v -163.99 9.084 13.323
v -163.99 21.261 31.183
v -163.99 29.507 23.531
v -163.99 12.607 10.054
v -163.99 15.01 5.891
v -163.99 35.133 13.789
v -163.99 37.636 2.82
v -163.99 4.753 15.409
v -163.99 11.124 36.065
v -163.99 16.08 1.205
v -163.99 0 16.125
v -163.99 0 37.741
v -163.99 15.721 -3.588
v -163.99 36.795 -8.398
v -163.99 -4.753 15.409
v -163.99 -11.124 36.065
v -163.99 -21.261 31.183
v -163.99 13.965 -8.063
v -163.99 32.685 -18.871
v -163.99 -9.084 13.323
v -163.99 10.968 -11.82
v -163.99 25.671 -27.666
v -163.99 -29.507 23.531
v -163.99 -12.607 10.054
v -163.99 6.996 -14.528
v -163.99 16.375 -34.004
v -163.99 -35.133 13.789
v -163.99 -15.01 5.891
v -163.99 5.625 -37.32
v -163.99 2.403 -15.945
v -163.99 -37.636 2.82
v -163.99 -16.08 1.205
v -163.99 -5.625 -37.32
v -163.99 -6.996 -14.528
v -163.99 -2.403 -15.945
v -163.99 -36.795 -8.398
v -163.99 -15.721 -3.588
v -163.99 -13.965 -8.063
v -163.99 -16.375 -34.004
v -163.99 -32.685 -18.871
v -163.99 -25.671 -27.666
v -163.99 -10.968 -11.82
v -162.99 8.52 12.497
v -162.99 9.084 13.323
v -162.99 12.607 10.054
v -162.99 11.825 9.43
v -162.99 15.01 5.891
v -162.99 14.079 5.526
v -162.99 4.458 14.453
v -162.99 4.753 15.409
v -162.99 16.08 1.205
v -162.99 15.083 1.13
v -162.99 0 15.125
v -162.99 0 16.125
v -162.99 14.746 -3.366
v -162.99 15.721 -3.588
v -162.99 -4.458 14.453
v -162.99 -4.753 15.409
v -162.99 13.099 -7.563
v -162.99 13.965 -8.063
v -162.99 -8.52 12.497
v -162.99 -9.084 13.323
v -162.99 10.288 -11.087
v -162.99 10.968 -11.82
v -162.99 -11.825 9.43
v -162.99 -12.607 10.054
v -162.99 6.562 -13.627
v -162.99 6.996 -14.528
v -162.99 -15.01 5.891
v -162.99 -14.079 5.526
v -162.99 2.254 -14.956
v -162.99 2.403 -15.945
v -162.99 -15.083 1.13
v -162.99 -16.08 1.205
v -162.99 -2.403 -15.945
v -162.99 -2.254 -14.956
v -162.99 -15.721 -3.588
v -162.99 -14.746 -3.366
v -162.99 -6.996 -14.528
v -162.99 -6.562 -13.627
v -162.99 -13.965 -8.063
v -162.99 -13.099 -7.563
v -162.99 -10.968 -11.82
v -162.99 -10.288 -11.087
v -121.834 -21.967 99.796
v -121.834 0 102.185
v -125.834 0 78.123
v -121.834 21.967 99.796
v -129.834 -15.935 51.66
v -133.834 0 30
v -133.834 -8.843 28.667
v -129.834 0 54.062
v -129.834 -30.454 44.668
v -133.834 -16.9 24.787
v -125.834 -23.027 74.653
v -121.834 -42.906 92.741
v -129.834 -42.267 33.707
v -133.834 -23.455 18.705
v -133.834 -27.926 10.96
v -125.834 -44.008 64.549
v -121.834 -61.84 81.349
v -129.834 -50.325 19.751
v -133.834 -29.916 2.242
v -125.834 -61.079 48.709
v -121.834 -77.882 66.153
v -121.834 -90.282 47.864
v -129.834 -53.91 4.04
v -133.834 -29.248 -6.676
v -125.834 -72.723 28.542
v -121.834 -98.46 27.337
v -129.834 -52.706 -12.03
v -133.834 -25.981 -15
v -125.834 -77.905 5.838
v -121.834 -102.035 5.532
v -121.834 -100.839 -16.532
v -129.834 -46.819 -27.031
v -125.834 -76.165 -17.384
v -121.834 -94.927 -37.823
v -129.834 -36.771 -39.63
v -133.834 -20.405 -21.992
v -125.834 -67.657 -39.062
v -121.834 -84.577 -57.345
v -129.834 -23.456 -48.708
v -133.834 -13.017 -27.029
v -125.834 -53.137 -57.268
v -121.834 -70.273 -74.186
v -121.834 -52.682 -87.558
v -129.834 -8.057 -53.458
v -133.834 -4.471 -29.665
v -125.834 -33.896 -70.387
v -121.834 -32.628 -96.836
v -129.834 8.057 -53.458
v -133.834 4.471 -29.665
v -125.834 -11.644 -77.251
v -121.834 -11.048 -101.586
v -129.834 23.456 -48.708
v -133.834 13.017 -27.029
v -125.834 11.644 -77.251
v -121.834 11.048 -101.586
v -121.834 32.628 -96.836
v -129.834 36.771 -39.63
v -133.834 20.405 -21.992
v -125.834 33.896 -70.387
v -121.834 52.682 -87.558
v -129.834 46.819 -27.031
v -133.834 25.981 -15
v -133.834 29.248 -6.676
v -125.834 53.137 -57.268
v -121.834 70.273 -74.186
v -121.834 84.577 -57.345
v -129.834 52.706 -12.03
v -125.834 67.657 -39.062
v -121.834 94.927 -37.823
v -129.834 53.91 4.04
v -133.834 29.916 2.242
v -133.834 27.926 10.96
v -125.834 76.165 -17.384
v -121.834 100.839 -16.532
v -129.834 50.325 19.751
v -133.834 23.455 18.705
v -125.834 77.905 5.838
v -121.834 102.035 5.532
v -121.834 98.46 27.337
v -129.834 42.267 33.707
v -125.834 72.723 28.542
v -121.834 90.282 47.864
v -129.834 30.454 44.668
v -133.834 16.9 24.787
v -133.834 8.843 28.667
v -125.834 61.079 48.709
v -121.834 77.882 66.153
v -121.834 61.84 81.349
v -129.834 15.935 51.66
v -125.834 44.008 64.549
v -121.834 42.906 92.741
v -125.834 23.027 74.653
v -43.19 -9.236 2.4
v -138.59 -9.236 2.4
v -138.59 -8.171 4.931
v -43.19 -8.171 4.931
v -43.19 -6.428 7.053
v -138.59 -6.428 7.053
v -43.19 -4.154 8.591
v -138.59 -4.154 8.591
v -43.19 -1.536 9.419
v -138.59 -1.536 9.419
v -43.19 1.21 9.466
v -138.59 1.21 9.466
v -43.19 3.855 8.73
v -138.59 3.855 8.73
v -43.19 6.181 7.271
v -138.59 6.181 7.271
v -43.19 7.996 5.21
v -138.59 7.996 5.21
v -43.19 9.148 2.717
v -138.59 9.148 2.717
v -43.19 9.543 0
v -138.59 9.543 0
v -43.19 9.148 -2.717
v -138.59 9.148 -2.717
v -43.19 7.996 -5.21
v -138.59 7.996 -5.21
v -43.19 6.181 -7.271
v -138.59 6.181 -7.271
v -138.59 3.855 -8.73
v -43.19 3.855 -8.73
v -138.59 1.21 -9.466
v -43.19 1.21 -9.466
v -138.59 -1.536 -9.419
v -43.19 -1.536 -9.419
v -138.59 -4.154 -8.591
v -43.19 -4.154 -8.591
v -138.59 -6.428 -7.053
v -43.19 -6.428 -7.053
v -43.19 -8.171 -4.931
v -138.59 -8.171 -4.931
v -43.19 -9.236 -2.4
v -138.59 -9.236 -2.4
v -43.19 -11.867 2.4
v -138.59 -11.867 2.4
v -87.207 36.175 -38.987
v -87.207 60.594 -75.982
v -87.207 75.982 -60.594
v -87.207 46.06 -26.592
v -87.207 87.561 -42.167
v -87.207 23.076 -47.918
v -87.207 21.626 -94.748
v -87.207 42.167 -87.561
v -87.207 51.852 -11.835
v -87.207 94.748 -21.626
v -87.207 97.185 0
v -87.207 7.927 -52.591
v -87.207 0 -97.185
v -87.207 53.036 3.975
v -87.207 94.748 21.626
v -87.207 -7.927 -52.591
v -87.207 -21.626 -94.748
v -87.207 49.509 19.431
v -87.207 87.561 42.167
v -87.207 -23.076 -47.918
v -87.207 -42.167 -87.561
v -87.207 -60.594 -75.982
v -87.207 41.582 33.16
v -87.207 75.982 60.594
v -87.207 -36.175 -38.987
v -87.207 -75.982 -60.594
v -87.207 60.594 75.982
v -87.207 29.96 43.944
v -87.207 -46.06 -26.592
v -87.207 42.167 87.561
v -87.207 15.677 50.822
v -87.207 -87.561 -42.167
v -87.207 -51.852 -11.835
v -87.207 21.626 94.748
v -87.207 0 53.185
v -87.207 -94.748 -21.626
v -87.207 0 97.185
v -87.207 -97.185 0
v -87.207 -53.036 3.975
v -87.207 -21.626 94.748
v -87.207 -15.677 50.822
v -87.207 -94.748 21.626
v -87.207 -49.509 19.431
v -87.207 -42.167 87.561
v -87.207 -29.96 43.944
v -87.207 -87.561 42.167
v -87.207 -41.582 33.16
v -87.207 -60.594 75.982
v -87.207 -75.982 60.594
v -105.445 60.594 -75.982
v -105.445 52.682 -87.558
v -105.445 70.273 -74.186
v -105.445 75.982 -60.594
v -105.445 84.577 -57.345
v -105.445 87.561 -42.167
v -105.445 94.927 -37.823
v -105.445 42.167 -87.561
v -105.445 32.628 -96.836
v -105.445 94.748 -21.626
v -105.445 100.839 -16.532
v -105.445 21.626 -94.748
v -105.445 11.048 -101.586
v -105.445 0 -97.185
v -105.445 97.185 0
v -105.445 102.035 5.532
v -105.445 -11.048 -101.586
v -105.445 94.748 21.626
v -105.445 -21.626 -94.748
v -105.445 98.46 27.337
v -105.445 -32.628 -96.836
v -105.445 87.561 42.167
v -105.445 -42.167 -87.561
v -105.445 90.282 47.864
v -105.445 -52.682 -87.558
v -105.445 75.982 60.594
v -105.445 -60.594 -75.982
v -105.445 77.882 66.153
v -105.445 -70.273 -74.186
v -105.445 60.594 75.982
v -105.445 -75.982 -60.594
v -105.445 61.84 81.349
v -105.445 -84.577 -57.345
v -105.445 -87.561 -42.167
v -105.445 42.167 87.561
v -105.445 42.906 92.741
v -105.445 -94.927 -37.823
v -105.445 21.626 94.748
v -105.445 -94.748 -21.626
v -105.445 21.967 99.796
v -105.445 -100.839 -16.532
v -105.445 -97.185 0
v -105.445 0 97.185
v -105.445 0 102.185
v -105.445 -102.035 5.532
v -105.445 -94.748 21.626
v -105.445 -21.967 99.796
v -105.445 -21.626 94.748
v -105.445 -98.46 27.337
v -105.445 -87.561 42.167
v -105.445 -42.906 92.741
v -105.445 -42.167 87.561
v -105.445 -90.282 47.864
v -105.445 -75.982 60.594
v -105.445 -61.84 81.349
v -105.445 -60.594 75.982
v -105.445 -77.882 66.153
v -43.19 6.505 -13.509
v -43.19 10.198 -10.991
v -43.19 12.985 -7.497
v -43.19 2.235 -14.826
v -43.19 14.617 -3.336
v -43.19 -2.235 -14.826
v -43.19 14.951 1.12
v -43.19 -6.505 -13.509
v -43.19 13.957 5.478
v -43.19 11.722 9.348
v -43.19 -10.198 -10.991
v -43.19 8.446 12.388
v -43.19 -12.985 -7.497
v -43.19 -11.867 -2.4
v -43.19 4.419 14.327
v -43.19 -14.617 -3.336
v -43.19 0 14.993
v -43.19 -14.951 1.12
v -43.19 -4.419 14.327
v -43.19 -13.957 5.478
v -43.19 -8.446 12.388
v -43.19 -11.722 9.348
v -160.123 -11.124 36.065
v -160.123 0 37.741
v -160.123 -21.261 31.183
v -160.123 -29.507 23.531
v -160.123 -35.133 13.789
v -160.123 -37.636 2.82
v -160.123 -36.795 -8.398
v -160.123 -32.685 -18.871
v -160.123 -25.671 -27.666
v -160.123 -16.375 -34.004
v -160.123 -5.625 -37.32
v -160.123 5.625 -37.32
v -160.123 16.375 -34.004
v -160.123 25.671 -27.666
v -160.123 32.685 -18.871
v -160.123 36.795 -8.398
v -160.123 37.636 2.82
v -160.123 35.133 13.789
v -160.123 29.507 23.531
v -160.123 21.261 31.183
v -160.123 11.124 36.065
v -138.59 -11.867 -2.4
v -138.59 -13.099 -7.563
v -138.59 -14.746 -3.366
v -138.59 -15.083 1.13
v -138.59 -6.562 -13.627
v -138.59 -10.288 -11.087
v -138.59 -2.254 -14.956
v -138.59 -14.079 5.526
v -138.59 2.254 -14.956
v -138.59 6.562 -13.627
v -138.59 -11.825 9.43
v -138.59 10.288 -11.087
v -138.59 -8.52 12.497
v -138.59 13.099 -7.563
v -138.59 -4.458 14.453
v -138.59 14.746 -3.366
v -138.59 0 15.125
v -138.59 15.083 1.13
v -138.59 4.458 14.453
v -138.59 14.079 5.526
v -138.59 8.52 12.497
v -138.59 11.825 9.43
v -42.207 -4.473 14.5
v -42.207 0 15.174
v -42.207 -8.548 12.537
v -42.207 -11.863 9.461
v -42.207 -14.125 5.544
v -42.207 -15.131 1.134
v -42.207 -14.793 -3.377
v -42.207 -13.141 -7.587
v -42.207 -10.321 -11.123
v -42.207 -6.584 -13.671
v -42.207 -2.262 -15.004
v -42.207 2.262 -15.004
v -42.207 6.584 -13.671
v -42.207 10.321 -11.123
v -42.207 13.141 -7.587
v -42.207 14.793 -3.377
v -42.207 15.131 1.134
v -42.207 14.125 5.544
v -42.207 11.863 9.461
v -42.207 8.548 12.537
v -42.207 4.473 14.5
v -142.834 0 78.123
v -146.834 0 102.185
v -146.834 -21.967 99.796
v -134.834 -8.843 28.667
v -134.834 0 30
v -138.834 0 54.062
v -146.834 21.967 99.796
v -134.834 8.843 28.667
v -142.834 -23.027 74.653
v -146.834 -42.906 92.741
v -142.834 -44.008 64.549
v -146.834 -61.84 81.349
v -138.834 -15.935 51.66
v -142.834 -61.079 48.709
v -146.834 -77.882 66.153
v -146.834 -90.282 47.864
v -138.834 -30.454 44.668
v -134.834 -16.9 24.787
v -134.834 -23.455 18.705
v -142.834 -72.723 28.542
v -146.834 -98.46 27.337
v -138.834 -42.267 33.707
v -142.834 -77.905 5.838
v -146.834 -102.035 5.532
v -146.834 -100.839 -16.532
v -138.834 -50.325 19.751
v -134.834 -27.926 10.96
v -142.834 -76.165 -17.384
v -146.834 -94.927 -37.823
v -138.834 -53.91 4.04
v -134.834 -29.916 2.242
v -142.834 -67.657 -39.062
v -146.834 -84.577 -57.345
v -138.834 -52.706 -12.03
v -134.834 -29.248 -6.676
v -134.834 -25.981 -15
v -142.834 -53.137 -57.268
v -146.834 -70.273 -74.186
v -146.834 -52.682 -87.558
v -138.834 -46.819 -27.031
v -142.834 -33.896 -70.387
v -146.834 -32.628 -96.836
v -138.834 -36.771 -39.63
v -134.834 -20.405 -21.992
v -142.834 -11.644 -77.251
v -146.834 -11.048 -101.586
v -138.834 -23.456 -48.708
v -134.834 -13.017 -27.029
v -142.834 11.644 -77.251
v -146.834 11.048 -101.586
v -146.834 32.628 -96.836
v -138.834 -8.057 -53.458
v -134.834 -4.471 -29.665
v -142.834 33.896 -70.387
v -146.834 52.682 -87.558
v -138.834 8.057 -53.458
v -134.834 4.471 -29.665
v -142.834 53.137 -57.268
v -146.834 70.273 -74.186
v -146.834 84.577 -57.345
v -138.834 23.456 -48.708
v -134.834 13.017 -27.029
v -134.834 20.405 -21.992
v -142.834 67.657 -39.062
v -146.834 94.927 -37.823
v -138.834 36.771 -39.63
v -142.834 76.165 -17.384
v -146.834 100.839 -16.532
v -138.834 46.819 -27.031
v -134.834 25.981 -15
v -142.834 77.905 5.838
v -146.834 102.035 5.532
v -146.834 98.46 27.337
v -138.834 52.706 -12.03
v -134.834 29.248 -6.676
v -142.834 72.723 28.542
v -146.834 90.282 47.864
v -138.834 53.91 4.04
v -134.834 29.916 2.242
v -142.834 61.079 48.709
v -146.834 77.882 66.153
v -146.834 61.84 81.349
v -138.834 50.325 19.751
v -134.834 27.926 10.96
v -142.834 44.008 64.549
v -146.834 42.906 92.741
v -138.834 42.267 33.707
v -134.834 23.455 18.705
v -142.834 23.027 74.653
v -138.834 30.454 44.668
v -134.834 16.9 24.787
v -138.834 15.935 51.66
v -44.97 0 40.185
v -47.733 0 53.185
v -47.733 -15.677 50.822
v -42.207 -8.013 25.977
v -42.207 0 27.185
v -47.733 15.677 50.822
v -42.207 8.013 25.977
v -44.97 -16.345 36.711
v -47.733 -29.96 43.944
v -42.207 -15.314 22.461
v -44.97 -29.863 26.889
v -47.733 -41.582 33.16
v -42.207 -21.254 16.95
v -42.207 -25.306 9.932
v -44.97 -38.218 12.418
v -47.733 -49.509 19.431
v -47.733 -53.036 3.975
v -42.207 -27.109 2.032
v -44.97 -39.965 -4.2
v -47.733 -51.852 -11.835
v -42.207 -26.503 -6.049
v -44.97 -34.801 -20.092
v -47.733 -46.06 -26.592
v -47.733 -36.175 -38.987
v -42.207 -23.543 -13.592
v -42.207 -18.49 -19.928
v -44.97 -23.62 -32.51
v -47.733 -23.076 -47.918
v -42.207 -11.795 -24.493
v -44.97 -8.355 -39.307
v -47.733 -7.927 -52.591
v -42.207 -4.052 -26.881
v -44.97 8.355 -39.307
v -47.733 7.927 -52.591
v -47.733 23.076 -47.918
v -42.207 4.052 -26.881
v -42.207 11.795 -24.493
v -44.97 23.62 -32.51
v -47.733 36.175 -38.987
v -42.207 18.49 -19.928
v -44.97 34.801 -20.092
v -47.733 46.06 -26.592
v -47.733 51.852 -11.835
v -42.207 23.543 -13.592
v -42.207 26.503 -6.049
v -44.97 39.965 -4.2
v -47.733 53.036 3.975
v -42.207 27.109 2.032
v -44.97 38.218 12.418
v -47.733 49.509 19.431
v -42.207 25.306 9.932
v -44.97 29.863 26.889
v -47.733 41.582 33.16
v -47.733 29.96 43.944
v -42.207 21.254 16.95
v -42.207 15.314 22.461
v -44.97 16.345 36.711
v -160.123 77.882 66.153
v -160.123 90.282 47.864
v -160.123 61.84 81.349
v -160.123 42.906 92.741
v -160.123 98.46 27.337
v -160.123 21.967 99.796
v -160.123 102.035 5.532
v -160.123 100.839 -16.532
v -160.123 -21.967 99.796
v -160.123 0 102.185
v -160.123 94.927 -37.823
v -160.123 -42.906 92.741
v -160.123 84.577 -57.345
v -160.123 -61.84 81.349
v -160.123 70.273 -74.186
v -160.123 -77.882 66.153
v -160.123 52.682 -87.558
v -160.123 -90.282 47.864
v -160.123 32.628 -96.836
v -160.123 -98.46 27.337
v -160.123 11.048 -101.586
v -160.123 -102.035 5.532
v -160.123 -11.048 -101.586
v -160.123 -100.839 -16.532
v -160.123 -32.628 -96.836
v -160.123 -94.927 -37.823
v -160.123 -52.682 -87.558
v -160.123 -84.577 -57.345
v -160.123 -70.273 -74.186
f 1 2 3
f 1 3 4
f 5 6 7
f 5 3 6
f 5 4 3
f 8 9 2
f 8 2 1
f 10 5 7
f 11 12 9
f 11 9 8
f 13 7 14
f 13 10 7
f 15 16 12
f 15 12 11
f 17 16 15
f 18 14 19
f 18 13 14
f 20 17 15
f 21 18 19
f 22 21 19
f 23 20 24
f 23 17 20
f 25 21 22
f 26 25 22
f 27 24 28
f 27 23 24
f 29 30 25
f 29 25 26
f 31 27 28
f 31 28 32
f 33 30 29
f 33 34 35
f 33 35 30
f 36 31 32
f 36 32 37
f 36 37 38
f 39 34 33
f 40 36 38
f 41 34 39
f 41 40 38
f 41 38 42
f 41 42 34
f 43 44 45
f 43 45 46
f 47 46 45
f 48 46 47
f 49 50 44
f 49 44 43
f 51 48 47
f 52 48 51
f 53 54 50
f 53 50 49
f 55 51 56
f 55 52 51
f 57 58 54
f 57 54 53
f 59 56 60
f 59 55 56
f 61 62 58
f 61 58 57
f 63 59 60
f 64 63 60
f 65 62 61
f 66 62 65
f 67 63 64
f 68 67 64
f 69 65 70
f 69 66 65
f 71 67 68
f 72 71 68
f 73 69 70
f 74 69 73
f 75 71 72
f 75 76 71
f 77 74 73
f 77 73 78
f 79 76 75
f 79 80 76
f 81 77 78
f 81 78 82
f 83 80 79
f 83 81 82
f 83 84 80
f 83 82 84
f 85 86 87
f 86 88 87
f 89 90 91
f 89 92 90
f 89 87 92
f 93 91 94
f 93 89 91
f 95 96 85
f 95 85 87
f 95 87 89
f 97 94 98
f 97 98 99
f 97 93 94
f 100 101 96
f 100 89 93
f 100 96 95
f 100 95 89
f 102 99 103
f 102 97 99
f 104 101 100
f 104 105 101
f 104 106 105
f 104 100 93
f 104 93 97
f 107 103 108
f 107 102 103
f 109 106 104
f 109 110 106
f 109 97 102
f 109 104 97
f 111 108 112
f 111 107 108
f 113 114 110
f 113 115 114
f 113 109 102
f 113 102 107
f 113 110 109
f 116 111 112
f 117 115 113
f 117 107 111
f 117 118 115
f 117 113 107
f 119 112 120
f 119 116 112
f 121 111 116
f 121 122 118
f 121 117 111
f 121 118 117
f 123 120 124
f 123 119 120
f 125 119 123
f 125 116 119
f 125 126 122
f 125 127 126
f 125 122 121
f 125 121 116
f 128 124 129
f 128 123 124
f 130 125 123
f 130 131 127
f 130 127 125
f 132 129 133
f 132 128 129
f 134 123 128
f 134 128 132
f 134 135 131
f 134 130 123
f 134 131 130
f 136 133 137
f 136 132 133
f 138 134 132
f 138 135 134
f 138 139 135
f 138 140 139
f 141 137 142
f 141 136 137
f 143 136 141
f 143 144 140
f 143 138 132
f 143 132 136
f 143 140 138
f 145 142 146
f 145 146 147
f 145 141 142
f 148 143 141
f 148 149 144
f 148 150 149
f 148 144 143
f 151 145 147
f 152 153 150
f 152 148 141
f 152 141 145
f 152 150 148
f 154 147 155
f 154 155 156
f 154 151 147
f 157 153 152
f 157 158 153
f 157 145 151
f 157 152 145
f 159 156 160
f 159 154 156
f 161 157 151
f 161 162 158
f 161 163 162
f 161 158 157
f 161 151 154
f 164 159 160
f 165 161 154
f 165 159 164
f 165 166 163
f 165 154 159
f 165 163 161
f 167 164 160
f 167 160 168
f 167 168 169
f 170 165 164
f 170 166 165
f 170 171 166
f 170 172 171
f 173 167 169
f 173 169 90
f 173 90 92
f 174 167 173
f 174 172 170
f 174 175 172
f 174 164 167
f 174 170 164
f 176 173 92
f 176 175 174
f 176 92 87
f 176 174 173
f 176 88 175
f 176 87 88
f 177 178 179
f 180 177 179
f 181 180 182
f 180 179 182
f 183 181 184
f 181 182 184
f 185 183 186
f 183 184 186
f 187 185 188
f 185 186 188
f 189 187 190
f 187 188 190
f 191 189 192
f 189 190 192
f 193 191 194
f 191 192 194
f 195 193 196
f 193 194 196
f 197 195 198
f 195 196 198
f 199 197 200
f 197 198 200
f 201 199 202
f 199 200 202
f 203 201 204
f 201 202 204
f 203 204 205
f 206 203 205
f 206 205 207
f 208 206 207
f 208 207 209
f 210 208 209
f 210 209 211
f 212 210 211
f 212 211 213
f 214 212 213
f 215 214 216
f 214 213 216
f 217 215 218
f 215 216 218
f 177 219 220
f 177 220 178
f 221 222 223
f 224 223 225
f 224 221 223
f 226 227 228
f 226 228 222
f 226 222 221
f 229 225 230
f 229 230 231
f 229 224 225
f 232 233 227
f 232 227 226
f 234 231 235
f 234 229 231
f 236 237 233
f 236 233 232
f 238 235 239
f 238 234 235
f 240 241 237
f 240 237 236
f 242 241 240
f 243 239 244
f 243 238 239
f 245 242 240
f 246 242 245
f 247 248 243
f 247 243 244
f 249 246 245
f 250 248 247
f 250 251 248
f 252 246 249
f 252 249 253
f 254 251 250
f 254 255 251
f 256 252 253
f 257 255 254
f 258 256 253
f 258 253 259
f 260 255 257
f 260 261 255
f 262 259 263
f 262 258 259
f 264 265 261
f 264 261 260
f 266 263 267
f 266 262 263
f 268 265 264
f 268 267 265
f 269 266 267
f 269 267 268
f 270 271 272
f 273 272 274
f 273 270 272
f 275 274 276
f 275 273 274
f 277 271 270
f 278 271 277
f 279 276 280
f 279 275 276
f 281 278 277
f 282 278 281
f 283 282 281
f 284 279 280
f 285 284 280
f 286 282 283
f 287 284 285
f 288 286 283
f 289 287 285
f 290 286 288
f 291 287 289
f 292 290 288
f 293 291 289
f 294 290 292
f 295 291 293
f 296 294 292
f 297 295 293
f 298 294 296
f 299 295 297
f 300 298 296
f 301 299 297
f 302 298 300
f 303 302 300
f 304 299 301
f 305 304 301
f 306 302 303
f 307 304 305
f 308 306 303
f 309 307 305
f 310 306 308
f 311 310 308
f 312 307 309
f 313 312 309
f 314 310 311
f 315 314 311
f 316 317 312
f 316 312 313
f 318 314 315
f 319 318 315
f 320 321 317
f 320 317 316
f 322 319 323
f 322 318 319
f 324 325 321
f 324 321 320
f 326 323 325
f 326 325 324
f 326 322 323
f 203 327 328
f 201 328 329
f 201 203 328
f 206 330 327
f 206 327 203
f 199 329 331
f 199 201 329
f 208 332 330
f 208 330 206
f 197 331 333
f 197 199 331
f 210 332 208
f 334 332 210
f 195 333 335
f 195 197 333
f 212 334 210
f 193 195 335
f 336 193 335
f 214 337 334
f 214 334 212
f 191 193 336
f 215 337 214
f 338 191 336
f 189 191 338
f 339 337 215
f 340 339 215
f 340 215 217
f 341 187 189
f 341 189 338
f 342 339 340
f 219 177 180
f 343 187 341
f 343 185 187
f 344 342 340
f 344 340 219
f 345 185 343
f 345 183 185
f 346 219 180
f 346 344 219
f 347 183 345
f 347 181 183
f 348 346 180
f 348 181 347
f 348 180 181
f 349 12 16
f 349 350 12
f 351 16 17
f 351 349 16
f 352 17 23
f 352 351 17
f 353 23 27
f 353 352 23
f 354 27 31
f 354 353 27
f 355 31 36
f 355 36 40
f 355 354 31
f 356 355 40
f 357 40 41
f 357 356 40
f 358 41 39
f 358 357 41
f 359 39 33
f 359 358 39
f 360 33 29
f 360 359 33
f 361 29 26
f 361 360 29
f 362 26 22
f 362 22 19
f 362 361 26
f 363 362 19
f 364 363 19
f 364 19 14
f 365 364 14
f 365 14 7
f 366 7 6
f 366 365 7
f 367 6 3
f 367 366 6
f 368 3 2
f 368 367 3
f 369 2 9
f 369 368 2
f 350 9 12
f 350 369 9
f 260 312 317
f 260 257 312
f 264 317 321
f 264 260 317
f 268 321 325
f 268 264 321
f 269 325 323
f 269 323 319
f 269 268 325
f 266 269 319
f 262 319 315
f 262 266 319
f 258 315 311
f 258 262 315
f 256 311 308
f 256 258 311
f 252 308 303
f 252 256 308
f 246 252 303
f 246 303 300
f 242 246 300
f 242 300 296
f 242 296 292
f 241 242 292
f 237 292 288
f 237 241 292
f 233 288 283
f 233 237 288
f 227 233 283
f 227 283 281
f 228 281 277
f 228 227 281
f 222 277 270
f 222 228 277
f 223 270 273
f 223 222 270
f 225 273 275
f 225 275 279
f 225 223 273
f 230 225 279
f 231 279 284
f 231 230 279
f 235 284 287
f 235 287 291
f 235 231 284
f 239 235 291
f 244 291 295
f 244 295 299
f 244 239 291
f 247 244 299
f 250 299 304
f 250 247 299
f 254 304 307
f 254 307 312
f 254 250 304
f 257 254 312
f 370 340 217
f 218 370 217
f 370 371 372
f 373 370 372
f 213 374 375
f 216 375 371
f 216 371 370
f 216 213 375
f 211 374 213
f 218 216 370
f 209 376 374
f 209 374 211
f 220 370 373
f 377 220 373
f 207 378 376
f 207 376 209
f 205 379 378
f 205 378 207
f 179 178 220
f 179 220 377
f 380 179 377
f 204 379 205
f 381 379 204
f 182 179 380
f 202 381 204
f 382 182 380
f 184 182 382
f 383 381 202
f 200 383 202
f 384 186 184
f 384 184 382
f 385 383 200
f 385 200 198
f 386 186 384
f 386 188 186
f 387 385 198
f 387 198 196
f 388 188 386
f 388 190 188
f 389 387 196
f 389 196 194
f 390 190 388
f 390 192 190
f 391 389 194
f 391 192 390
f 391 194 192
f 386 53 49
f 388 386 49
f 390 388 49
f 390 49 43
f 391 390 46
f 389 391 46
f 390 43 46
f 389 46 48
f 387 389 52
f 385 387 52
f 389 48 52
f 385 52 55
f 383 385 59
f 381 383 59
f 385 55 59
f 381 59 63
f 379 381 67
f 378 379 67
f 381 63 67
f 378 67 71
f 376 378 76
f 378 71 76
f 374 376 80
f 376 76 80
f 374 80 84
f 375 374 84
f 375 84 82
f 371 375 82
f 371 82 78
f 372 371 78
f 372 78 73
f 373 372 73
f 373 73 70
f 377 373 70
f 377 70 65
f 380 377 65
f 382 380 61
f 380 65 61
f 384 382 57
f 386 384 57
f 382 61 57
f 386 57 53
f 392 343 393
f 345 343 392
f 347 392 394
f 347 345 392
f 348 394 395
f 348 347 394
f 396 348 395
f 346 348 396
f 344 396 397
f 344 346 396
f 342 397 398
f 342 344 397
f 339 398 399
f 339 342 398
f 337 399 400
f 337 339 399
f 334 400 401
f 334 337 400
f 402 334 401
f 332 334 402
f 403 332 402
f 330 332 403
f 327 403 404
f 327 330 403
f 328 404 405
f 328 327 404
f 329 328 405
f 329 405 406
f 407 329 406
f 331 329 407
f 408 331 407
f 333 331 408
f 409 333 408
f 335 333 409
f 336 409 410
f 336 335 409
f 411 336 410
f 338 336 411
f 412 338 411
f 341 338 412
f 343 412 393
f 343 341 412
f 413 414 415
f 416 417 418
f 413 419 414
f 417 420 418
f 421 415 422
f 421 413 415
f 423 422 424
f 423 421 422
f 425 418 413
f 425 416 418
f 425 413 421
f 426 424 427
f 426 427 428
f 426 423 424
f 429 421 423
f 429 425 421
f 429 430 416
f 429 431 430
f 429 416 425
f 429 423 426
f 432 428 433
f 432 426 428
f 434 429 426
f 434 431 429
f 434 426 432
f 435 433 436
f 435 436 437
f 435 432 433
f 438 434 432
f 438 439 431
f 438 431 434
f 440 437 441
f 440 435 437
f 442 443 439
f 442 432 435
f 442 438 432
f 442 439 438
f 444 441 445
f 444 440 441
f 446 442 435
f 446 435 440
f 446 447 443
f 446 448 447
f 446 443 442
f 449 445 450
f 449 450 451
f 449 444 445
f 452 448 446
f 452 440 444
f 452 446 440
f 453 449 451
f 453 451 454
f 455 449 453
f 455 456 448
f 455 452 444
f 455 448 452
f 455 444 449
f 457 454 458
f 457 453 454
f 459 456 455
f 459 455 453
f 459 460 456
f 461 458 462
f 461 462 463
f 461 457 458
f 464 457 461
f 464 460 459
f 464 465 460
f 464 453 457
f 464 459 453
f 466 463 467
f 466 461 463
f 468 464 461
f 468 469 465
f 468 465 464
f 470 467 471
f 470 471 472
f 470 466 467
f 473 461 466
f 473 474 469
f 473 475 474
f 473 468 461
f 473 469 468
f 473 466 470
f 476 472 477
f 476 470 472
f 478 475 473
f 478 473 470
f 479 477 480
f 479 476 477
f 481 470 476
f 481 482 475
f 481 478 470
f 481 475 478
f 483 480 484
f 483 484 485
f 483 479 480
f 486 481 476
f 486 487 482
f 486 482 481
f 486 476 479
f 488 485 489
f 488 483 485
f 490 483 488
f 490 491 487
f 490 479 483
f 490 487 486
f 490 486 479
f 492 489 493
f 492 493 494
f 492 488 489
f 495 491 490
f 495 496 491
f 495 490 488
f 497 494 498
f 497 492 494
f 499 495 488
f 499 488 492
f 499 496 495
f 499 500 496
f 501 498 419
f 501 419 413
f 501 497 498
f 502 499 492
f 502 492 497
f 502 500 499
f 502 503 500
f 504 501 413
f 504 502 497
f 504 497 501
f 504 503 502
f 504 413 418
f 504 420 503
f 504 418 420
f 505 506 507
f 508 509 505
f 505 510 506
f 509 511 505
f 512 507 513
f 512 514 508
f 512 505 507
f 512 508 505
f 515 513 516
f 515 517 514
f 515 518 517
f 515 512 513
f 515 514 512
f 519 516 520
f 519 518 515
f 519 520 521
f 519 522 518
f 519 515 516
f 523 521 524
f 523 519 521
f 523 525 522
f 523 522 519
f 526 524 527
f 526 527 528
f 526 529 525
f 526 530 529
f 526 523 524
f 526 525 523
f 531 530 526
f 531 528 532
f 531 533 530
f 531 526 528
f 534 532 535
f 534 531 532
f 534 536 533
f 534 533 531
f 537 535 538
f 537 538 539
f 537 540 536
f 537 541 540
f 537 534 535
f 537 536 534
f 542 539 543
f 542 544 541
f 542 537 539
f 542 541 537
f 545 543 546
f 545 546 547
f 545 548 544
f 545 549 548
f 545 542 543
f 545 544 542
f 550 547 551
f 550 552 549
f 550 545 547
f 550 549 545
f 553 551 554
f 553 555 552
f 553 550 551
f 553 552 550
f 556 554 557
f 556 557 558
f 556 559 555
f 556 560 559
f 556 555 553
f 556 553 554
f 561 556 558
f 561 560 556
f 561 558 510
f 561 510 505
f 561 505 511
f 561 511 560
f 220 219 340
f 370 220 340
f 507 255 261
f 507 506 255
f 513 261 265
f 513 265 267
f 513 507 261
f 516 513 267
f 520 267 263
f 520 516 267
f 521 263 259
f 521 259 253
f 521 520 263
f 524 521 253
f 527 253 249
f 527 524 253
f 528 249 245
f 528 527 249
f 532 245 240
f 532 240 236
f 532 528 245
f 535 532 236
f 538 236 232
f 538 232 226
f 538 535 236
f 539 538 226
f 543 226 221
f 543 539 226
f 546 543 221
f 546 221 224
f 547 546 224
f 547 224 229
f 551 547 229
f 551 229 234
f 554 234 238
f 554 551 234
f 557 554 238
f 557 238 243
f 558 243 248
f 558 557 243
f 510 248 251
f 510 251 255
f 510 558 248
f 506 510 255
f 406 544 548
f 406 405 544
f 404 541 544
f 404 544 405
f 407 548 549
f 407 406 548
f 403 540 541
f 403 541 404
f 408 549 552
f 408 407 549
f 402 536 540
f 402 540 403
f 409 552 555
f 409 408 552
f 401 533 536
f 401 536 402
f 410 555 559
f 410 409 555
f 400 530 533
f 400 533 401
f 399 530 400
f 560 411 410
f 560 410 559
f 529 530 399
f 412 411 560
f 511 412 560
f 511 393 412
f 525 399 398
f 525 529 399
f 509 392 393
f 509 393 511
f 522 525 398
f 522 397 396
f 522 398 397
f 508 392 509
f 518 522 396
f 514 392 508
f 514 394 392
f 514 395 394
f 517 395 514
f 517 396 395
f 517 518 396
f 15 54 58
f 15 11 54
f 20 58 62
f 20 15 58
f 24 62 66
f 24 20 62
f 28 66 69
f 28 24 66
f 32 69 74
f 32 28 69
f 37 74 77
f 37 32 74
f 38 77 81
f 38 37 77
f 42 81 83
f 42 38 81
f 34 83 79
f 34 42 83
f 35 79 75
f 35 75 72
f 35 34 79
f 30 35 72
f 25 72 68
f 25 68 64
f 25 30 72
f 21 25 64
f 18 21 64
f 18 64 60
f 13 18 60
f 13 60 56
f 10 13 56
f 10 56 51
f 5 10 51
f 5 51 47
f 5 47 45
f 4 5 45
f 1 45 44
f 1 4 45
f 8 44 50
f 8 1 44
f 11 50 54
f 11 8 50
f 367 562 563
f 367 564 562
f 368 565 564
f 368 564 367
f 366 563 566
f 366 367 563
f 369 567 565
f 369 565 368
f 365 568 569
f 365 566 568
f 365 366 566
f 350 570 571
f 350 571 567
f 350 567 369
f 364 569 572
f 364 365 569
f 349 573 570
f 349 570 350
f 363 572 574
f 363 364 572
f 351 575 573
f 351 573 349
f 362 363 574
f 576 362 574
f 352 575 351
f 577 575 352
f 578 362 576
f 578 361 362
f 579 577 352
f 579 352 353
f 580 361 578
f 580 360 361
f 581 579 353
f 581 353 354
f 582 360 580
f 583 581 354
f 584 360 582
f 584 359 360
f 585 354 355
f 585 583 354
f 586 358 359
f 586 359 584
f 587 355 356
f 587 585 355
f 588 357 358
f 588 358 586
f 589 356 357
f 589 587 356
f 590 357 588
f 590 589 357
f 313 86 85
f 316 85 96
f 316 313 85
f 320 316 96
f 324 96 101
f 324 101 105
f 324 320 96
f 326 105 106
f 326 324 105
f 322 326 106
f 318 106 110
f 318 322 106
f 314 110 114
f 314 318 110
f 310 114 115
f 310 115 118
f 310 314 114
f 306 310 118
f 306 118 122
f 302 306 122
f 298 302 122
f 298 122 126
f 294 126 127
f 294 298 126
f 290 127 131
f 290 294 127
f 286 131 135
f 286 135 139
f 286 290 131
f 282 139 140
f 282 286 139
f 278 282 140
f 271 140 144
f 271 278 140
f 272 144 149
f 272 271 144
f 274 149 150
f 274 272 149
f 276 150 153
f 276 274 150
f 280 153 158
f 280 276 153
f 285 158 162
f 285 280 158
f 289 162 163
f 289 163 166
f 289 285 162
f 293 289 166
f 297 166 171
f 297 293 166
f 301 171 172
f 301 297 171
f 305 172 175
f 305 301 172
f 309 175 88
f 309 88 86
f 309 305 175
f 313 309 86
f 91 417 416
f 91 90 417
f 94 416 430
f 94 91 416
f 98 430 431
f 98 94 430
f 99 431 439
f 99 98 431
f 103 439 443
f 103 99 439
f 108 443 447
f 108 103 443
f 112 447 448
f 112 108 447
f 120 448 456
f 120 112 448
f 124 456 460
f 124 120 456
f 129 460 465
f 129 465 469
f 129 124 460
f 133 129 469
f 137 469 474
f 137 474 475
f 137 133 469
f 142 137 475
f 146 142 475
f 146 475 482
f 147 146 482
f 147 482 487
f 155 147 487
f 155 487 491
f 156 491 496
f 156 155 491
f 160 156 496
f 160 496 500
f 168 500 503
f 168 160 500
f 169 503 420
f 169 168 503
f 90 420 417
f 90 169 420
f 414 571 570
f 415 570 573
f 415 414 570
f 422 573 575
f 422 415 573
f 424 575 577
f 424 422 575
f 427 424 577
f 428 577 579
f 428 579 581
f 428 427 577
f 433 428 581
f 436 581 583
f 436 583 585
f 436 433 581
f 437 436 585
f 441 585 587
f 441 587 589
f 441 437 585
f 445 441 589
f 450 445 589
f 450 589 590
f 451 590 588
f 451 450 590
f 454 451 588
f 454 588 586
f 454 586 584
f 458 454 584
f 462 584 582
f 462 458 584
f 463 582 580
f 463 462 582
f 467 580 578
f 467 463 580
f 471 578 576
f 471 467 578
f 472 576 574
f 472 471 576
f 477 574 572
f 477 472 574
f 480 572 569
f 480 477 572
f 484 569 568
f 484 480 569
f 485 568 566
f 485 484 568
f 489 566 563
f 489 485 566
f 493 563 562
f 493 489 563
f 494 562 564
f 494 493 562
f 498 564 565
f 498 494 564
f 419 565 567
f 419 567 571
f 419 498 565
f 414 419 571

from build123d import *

# Parameters (mm, degrees)
SKETCH2_R          = 15.125
CUT_EXTRUDE5_DEPTH = 24.4
CUT_EXTRUDE6_REACH = 175.705
SKETCH3_R          = 9.543
CUT_EXTRUDE7_REACH = 190.351
SKETCH4_W          = 4.8
SKETCH4_H          = 4.648


with BuildPart() as part:
    # Sketch1 → Revolve1 (revolve)
    with BuildSketch(Plane.XY, mode=Mode.PRIVATE) as revolve1_sk:
        Polygon((-162.990125159, 0), (-162.990125159, 16.125), (-163.990125159, 16.125), (-163.990125159, 37.741454009), (-160.123125159, 37.741454009), (-160.123125159, 102.18499912), (-146.834181255, 102.18499912), (-134.834181255, 30), (-133.834181255, 30), (-121.834181255, 102.18499912), (-105.445019466, 102.18499912), (-105.445019466, 97.18499912), (-87.20655247, 97.18499912), (-87.20655247, 53.18499912), (-47.733023073, 53.18499912), (-42.20655247, 27.18499912), (-42.20655247, 15.17389025), (-43.190125159, 14.993377744), (-43.190125159, 0), align=None)
    revolve(revolve1_sk.sketch.rotate(Axis((-162.990125159, 0, 0), (1, 0, 0)), 90), axis=Axis((-162.990125159, 0, 0), (1, 0, 0)))

    # Sketch2 → Cut-Extrude5 (cut)
    with BuildSketch(Plane.ZY.offset(162.990125159)):
        Circle(SKETCH2_R)
    extrude(amount=-CUT_EXTRUDE5_DEPTH, mode=Mode.SUBTRACT)

    # Sketch3 → Cut-Extrude6 (cut, up to next)
    with BuildSketch(Plane.ZY.offset(138.590125159), mode=Mode.PRIVATE) as cut_extrude6_sk1:
        Circle(SKETCH3_R)
    cut_extrude6_tool1 = extrude(cut_extrude6_sk1.sketch, amount=-CUT_EXTRUDE6_REACH, mode=Mode.PRIVATE) & part.part
    add(cut_extrude6_tool1.solids().sort_by_distance((-138.590125, 0, 0))[0], mode=Mode.SUBTRACT)

    # Sketch4 → Cut-Extrude7 (cut, up to next)
    with BuildSketch(Plane(origin=(-43.190125159, 0, 0), x_dir=(0, 0, -1), z_dir=(1, 0, 0)), mode=Mode.PRIVATE) as cut_extrude7_sk1:
        with Locations((0, -9.543)):
            Rectangle(SKETCH4_W, SKETCH4_H)
    cut_extrude7_tool1 = extrude(cut_extrude7_sk1.sketch, amount=-CUT_EXTRUDE7_REACH, mode=Mode.PRIVATE) & part.part
    add(cut_extrude7_tool1.solids().sort_by_distance((-43.190125, -9.543, 0))[0], mode=Mode.SUBTRACT)


solid = part.part
